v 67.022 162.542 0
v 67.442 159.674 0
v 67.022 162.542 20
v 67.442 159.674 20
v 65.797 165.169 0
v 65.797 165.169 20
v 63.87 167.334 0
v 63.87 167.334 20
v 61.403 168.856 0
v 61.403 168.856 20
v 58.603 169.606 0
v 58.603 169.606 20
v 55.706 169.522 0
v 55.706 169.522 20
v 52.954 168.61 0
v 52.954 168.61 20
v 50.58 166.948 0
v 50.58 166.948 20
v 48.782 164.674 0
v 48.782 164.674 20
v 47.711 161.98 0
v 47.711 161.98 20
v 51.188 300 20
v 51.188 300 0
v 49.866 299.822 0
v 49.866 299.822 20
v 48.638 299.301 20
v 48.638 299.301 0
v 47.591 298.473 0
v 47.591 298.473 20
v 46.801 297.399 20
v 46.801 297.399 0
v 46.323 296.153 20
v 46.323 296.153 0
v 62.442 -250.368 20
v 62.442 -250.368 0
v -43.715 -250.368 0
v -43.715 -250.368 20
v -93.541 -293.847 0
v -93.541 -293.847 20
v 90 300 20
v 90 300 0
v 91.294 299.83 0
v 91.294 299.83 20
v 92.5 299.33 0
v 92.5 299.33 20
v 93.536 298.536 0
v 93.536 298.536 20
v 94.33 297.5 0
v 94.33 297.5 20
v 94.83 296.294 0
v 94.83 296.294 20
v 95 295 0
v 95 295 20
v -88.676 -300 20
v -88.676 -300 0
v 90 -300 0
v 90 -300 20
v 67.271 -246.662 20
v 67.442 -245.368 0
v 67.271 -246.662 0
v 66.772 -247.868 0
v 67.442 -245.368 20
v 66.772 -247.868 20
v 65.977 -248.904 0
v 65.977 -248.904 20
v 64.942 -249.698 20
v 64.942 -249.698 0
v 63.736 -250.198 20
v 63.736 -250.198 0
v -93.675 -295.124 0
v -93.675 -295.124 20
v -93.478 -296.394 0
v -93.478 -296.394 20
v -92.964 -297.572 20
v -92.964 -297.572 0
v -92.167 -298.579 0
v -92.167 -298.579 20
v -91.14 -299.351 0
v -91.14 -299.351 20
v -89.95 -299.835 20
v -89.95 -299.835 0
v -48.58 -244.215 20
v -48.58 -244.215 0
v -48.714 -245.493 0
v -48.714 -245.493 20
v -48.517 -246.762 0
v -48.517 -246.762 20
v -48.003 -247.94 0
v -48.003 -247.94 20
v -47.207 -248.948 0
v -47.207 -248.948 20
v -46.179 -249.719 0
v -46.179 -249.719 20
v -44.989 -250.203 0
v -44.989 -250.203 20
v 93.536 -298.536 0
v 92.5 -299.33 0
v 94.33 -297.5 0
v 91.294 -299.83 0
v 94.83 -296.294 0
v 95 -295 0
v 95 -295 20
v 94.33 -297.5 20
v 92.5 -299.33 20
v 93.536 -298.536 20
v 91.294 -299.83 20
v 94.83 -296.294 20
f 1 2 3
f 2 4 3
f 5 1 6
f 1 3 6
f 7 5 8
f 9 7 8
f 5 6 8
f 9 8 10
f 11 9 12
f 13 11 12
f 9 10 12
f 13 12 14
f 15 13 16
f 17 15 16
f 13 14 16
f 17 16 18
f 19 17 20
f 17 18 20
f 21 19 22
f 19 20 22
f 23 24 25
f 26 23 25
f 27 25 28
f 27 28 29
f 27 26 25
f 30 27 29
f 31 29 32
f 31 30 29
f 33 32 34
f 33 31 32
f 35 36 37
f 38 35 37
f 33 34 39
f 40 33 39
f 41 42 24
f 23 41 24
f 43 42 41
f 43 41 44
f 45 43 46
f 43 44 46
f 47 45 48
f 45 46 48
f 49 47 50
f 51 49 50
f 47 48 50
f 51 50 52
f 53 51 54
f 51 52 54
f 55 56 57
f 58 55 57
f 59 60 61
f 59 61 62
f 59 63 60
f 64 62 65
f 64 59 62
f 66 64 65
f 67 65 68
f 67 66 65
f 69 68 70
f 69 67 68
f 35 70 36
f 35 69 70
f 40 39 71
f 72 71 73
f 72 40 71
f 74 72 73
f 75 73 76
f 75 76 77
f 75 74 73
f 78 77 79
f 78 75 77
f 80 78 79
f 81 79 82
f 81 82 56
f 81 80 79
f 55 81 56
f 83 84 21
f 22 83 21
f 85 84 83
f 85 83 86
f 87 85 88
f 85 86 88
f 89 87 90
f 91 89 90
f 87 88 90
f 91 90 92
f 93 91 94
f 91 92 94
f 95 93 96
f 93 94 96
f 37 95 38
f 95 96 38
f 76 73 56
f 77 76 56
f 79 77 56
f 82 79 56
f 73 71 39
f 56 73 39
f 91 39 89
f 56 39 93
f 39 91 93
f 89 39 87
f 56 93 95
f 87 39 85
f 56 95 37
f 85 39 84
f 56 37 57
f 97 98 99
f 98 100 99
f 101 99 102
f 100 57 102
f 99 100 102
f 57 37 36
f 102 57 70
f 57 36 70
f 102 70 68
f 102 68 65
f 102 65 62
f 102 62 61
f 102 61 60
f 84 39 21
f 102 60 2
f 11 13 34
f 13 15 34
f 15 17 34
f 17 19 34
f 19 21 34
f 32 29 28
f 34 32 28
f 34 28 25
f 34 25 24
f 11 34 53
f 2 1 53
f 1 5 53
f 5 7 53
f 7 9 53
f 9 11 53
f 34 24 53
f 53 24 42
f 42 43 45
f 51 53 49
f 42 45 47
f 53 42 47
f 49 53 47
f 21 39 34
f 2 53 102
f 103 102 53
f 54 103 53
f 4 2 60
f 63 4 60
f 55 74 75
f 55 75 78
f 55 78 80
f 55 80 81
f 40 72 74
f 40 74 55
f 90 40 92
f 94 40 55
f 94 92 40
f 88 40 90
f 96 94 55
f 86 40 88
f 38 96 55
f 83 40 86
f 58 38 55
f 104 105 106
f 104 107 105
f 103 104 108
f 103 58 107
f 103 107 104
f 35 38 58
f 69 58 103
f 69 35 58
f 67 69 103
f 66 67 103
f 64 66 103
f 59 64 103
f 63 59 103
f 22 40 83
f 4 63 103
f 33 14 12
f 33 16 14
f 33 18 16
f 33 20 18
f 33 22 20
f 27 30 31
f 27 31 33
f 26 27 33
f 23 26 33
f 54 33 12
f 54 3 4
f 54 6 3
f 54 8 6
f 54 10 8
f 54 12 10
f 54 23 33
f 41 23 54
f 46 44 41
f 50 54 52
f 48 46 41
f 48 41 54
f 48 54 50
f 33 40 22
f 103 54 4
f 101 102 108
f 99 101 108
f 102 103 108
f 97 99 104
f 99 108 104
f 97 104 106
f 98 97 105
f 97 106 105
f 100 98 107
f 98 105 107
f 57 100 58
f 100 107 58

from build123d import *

# Parameters (mm, degrees)
F1_DEPTH = 20
F2_R     = 5
F3_R     = 10


with BuildPart() as f1:
    # F0 (on Top) → F1 (new body)
    with BuildSketch(Plane.XY):
        Polygon((95, 300), (47.234748, 300), (-95, -300), (95, -300), align=None)
        Polygon((67.441747, -250.368297), (-50.0391, -250.368297), (67.441747, 245.210379), align=None, mode=Mode.SUBTRACT)
    extrude(amount=F1_DEPTH)

    # F2
    f2_edges = [f1.edges().sort_by_distance(p)[0] for p in [
        (95, 300, 10),
        (95, -300, 10),
        (-95, -300, 10),
        (67.441747, -250.368297, 10),
        (-50.0391, -250.368297, 10),
        (47.234748, 300, 10),
    ]]
    fillet(f2_edges, radius=F2_R)

    # F3
    f3_edges = [f1.edges().sort_by_distance(p)[0] for p in [
        (67.441747, 245.210379, 10),
    ]]
    fillet(f3_edges, radius=F3_R)


solid = f1.part
